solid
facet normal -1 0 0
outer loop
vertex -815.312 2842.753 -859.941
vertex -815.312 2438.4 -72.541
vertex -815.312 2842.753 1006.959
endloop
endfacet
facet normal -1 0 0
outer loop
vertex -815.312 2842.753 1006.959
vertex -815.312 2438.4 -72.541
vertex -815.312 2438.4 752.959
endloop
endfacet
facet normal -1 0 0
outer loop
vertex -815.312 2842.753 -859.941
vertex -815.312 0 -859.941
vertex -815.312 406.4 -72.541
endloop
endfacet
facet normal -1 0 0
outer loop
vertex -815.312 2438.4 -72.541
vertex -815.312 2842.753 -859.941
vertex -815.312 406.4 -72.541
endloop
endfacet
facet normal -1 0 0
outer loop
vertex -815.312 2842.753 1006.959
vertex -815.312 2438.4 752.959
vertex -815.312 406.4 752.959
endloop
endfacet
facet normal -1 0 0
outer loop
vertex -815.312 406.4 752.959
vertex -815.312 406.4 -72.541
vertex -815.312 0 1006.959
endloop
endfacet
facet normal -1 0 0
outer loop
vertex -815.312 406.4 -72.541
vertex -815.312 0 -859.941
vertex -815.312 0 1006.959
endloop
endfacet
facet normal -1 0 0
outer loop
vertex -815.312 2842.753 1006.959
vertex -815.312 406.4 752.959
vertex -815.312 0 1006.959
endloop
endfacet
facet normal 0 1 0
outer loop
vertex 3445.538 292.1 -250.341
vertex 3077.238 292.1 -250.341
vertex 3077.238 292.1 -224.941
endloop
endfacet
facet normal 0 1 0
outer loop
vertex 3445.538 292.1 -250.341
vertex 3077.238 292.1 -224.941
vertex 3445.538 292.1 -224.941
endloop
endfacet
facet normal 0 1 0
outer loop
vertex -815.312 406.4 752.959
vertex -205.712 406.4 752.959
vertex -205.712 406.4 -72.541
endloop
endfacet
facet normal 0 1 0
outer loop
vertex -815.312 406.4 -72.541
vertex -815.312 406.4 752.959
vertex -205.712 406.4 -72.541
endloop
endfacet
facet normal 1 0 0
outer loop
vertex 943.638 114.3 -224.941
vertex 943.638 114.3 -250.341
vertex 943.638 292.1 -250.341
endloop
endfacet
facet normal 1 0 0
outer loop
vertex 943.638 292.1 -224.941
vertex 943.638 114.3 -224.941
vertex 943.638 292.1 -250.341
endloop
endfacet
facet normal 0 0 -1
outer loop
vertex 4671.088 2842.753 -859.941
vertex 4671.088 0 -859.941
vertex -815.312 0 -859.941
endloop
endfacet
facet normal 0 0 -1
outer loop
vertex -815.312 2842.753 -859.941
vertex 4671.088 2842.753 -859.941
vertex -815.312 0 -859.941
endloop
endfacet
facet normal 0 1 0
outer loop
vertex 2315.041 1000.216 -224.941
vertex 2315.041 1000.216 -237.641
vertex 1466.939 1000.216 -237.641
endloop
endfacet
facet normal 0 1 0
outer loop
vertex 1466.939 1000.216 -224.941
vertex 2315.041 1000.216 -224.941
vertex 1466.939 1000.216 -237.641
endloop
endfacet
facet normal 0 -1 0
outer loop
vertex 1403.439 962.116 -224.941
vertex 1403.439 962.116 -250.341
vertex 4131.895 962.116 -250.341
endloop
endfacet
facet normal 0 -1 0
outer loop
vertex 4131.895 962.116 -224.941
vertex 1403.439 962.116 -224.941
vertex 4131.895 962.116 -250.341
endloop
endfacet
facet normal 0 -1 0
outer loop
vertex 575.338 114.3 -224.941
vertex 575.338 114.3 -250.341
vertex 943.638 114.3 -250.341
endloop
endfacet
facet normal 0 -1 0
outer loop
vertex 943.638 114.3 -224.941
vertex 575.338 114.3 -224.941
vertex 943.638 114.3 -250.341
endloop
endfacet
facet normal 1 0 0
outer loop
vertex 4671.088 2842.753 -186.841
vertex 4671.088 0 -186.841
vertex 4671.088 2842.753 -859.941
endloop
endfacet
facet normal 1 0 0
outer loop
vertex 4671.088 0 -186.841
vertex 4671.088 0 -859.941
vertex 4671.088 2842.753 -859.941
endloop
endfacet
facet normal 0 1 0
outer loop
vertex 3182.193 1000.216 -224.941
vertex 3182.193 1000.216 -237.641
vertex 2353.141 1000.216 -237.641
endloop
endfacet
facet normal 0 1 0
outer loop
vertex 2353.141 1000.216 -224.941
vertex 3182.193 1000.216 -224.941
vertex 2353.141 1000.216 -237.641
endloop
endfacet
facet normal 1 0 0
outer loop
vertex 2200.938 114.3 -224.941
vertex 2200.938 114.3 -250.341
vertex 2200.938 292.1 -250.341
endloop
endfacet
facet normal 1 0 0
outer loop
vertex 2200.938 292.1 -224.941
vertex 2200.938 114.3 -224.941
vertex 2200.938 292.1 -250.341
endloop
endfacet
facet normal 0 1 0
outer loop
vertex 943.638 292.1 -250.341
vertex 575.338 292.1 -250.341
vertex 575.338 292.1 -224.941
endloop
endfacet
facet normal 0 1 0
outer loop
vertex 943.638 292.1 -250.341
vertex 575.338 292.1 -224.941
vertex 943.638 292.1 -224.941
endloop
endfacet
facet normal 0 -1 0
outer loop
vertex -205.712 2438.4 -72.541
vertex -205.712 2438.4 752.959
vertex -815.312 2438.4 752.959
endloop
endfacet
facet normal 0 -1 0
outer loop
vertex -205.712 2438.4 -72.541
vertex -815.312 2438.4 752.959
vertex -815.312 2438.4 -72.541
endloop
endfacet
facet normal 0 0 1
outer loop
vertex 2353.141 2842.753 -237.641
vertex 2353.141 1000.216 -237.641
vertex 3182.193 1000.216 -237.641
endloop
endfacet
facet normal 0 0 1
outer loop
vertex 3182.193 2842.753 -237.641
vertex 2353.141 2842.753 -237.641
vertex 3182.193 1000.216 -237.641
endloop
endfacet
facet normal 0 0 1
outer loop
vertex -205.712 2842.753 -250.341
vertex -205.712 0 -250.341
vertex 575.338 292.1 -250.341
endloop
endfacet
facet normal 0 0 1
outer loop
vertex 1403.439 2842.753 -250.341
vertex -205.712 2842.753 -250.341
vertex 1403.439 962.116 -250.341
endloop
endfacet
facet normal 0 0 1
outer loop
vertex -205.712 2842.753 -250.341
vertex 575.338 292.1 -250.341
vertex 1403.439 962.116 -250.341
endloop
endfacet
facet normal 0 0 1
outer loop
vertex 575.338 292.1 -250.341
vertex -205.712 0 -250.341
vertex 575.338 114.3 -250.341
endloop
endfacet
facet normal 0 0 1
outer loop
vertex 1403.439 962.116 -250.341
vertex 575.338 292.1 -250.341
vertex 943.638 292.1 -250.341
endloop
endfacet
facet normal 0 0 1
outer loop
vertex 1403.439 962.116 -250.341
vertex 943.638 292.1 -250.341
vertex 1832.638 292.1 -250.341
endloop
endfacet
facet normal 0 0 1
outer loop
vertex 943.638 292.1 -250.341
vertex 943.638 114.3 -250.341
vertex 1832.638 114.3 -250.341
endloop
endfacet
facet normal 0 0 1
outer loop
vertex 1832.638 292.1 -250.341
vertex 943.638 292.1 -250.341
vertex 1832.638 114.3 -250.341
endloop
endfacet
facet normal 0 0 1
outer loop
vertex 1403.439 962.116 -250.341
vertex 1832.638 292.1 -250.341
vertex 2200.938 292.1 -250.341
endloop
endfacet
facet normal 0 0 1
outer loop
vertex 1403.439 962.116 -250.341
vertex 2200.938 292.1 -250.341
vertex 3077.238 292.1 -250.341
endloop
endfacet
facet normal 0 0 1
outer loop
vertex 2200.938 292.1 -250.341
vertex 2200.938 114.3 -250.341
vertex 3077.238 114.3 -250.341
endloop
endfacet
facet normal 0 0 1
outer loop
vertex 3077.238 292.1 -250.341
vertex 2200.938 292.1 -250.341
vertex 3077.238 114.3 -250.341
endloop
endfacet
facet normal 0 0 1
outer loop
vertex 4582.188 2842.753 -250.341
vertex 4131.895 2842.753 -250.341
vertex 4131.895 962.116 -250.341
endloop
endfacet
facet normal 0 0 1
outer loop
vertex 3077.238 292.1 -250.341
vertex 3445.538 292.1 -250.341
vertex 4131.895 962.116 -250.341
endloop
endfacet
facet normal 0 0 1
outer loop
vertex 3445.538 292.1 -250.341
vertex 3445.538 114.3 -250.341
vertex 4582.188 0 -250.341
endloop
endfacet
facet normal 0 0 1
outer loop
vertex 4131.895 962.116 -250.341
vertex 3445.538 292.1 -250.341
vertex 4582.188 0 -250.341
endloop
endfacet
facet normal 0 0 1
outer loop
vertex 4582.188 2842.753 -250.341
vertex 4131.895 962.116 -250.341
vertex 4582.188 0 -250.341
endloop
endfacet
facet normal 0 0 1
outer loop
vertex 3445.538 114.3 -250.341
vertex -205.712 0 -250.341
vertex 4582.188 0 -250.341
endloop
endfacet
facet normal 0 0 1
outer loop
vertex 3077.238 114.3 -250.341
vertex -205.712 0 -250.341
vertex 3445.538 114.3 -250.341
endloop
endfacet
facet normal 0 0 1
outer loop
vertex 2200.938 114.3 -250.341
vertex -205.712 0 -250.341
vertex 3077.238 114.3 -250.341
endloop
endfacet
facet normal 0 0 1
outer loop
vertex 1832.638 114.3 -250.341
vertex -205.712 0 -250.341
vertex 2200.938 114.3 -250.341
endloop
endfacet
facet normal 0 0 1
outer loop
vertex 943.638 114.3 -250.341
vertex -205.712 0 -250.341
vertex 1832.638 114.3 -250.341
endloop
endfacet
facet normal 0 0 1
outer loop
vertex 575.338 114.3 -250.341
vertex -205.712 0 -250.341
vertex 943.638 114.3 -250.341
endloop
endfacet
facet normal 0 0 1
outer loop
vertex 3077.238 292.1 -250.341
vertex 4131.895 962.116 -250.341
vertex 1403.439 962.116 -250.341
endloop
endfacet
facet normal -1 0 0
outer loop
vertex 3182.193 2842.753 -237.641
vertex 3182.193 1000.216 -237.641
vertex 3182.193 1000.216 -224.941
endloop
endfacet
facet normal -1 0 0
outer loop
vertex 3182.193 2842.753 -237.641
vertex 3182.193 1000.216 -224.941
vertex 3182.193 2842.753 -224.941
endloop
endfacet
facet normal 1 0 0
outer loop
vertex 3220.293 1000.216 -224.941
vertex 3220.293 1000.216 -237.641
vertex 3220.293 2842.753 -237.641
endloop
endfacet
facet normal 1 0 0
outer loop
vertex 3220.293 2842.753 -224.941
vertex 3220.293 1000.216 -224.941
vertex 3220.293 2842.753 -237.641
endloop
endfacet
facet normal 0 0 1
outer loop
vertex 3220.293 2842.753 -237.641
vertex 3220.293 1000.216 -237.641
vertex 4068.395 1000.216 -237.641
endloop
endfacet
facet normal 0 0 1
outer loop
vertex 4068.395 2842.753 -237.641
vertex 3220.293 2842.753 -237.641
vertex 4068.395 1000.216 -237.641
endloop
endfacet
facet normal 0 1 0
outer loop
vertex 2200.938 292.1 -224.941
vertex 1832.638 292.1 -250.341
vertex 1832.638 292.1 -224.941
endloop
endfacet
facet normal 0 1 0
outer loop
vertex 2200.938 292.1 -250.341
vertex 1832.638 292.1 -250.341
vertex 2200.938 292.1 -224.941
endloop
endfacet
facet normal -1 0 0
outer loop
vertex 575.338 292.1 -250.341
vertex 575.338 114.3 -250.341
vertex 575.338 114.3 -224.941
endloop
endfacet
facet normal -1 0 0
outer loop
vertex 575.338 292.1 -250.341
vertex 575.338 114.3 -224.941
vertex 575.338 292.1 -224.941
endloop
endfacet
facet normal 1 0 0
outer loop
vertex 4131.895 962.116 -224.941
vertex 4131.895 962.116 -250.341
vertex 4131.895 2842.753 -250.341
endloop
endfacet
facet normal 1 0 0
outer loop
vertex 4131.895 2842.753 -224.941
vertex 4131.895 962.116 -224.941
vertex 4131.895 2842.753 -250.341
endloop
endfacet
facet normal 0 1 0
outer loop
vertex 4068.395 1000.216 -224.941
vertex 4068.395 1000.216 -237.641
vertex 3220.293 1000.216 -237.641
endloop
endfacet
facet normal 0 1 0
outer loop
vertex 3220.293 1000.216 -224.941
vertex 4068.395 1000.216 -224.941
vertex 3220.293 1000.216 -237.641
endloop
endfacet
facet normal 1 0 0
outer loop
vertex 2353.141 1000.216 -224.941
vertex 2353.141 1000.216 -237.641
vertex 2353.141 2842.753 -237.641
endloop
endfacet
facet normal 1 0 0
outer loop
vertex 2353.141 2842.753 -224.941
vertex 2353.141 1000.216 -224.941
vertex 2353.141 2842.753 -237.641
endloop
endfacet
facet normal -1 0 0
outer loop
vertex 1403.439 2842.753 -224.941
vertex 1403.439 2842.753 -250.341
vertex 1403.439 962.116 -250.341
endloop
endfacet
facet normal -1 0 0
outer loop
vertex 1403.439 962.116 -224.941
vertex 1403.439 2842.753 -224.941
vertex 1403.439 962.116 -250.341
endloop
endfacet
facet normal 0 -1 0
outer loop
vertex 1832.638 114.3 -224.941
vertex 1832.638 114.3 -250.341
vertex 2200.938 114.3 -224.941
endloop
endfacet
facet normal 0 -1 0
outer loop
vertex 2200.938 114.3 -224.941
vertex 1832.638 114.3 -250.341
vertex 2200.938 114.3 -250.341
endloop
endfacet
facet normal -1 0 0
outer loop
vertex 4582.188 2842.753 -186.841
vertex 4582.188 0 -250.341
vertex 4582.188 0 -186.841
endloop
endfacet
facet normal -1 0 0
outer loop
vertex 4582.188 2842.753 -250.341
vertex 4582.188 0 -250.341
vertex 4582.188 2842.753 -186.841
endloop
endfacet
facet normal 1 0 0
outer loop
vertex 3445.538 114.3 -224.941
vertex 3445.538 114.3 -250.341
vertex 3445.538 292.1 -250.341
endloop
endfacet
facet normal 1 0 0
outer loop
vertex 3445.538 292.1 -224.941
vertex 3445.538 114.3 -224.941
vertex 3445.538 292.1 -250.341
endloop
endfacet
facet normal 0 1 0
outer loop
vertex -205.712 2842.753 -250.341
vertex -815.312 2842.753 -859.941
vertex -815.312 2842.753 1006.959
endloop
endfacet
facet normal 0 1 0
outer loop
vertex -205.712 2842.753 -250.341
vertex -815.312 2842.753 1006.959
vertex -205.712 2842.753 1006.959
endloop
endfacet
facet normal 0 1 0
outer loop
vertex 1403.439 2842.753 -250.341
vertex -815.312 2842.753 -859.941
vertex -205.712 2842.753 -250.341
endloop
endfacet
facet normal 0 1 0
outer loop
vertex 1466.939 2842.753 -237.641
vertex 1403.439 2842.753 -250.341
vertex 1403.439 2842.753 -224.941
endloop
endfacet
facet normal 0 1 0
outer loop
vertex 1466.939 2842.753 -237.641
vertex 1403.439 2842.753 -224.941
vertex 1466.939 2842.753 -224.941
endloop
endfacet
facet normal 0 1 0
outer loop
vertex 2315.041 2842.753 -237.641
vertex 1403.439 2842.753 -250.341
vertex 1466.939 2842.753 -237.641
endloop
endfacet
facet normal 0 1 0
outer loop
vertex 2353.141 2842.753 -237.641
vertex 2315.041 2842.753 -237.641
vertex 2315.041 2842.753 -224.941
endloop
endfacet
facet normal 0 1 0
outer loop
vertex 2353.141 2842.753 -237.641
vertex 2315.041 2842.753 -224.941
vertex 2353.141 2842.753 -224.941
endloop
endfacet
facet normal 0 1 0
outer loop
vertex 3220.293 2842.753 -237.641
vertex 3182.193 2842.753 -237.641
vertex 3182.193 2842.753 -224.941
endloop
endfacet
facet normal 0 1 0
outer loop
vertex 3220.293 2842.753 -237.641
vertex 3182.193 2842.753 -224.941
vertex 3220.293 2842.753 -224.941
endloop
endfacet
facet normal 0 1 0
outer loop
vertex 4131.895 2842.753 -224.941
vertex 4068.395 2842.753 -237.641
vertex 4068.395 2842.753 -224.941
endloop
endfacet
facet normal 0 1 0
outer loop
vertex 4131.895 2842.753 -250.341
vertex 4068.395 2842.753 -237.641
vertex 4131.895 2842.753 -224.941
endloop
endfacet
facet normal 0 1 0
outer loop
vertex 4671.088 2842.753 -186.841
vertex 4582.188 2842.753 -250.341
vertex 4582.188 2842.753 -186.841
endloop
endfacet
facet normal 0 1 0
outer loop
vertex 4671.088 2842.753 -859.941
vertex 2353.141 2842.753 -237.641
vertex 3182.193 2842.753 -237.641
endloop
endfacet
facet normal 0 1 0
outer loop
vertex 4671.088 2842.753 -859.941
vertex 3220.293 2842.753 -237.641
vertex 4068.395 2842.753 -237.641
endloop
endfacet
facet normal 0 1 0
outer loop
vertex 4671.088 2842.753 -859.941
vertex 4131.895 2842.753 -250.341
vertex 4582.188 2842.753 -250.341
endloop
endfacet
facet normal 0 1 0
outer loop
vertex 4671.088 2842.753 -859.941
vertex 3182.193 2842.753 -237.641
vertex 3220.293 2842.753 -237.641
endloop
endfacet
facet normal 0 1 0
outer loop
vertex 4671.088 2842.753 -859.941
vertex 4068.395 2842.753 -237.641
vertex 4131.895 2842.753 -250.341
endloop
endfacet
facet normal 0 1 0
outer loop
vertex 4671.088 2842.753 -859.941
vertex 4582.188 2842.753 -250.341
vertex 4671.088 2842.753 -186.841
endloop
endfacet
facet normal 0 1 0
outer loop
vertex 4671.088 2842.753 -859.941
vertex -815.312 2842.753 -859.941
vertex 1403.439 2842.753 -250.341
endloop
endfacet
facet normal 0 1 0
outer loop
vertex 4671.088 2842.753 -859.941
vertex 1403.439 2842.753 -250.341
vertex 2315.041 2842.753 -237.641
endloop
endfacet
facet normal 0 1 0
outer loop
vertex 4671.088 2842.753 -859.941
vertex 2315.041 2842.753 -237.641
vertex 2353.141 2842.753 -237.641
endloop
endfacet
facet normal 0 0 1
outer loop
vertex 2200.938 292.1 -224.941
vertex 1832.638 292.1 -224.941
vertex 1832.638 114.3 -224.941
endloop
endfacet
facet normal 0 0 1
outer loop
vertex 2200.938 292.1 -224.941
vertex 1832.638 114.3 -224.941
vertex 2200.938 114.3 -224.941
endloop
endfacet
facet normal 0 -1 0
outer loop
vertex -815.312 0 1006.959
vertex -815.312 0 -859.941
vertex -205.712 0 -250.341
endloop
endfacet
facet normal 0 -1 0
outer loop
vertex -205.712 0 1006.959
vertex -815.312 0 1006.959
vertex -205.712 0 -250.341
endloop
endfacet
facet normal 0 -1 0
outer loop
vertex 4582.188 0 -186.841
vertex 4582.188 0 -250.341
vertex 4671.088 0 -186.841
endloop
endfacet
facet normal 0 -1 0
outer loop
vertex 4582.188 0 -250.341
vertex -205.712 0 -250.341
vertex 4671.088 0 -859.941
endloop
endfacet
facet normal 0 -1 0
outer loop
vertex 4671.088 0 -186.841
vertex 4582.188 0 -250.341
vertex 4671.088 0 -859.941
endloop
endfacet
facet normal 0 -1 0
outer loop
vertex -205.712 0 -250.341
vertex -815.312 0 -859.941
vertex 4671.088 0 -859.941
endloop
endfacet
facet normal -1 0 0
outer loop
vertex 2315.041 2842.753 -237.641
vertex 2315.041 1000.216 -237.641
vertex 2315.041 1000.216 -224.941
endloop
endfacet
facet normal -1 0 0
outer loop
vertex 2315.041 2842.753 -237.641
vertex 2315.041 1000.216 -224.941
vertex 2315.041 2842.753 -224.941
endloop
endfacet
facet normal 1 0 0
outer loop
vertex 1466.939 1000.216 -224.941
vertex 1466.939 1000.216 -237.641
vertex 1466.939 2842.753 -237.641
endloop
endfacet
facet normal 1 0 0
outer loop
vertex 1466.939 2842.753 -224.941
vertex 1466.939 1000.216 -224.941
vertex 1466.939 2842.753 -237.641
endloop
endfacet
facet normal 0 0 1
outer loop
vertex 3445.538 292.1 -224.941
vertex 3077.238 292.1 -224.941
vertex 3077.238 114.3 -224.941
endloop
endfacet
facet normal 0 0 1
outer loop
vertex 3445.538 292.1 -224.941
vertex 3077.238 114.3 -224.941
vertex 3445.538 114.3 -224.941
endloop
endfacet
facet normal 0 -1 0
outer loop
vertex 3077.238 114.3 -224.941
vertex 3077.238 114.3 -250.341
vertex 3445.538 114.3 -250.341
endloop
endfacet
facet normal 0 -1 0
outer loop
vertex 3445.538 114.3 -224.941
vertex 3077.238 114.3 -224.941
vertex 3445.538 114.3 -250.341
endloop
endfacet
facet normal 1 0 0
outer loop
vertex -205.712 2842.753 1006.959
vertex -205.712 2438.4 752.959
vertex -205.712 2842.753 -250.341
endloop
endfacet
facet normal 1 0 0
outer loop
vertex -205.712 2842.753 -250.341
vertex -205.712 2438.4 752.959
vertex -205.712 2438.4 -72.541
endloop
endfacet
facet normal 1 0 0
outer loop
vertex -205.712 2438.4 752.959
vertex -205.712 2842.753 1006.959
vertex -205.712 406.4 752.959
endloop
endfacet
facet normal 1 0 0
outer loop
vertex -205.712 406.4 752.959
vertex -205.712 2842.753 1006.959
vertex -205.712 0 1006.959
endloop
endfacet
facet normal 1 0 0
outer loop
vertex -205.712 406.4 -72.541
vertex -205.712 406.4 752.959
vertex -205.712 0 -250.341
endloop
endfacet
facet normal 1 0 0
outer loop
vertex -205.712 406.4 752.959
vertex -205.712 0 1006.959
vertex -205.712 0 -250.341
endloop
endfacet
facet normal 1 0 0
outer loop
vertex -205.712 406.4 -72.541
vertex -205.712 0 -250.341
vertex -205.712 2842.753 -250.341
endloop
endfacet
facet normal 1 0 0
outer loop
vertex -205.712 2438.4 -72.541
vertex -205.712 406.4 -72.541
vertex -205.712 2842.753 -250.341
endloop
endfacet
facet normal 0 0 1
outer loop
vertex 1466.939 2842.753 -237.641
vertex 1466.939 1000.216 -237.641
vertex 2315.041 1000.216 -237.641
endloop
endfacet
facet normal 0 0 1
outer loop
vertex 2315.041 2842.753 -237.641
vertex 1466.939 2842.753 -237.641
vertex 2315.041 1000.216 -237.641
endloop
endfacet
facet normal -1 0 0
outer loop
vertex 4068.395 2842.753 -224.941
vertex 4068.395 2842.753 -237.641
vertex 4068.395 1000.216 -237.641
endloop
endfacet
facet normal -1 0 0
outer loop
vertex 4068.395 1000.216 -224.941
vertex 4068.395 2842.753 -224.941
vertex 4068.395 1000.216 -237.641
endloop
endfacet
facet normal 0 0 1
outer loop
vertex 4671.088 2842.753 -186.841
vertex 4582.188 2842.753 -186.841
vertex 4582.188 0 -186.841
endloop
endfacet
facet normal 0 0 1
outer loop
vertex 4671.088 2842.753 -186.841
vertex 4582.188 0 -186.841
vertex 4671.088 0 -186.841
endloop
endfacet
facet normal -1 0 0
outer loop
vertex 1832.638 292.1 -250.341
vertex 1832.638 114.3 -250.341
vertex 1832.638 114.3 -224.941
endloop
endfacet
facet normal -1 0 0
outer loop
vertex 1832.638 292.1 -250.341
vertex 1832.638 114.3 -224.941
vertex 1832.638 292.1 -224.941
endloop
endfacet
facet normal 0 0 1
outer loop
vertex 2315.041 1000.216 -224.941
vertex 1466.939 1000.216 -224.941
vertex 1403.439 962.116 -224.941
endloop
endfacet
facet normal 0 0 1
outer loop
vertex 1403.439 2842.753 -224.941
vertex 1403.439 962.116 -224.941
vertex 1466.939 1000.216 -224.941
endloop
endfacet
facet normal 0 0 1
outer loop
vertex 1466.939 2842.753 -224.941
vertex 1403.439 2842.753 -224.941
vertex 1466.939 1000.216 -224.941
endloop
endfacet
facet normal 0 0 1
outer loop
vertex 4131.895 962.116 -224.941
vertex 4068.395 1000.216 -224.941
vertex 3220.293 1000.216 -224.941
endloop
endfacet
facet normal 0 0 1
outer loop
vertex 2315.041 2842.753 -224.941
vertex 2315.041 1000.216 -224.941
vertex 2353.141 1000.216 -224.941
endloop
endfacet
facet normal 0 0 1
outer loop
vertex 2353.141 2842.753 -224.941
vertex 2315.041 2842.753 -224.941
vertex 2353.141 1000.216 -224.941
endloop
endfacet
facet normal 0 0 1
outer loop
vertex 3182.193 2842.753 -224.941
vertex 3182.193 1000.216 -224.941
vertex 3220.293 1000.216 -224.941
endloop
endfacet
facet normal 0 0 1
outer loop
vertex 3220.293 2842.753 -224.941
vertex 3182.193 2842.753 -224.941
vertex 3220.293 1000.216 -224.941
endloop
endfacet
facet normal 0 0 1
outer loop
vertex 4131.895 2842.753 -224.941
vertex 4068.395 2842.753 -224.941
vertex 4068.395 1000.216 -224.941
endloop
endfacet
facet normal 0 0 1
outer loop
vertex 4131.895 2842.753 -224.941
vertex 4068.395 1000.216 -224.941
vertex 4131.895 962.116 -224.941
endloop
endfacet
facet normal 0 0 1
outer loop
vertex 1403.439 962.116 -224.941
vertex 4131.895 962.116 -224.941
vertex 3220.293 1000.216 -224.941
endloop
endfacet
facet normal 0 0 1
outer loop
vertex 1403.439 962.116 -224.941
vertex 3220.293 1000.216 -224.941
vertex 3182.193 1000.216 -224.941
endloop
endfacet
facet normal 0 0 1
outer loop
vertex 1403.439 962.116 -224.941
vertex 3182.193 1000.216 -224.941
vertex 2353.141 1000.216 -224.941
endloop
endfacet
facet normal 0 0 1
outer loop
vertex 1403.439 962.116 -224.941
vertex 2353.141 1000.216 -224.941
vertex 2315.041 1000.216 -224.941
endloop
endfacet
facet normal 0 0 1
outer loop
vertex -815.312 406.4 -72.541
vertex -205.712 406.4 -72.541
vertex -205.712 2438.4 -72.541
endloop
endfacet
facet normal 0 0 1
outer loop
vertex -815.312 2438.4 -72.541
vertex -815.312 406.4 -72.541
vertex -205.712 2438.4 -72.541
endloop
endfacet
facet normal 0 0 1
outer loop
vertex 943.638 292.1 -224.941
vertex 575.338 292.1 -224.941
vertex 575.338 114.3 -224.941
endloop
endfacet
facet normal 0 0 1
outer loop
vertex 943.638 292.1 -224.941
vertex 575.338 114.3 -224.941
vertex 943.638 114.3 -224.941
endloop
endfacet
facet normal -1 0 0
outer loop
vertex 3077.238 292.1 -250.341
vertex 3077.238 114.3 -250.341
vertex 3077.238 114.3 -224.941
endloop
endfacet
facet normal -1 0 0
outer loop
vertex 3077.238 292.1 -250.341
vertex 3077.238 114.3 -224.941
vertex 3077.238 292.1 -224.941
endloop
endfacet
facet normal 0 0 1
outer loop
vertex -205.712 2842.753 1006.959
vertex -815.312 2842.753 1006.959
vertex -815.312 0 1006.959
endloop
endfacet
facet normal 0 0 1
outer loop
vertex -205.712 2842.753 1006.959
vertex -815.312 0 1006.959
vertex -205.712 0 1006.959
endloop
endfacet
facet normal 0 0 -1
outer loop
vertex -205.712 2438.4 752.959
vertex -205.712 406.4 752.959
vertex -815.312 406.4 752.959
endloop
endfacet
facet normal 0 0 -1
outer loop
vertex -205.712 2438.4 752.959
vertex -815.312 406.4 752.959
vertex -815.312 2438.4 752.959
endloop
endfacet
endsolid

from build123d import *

# Parameters (mm, degrees)
HOUSE_EXTRUDE_Y_DEPTH        = 2842.753046323
DOOR_W                       = 825.5
DOOR_H                       = 2032
DOOR_CUT_X_DEPTH             = 609.6
WINDOW_W                     = 38.1
WINDOW_H                     = 1842.537075404
WINDOW_FRAME_EXTRUDE_Z_DEPTH = 25.4
WINDOW_3_W                   = 848.102040266
WINDOW_3_H                   = 1842.537075404
WINDOW_3_W_2                 = 829.052040266
WINDOW_GLASS_EXTRUDE_Z_DEPTH = 12.7
DRAIN_PIPE_W                 = 88.9
DRAIN_PIPE_H                 = 2842.753046323
DRAIN_PIPE_EXTRUDE_Z_DEPTH   = 63.5
VENTS_W                      = 368.3
VENTS_H                      = 177.8
VENTS_EXTRUDE_Z_DEPTH        = 25.4


with BuildPart() as part:
    # Wall Footprint → House Extrude +Y (new body)
    with BuildSketch(Plane(origin=(0, 0, 0), x_dir=(1, 0, 0), z_dir=(0, 1, 0))):
        Polygon((-205.711590821, 250.340578873), (4671.088409179, 250.340578873), (4671.088409179, 859.940578873), (-815.311590821, 859.940578873), (-815.311590821, -1006.959421127), (-205.711590821, -1006.959421127), align=None)
    extrude(amount=HOUSE_EXTRUDE_Y_DEPTH)

    # Door → Door Cut -X (cut)
    with BuildSketch(Plane(origin=(-205.711590821, 0, 0), x_dir=(0, 0, -1), z_dir=(1, 0, 0))):
        with Locations((-340.209421127, 1422.4)):
            Rectangle(DOOR_W, DOOR_H)
    extrude(amount=-DOOR_CUT_X_DEPTH, mode=Mode.SUBTRACT)

    # Window → Window Frame Extrude +Z (add)
    with BuildSketch(Plane.XY.offset(-250.340578873)):
        Polygon((1403.438613425, 2842.753046323), (1403.438613425, 962.115970919), (4131.894734223, 962.115970919), (4131.894734223, 2842.753046323), (4068.394734223, 2842.753046323), (4068.394734223, 1000.215970919), (3220.292693957, 1000.215970919), (3182.192693957, 1000.215970919), (2353.140653691, 1000.215970919), (2315.040653691, 1000.215970919), (1466.938613425, 1000.215970919), (1466.938613425, 2842.753046323), align=None)
        with Locations((2334.090653691, 1921.484508621)):
            Rectangle(WINDOW_W, WINDOW_H)
        with Locations((3201.242693957, 1921.484508621)):
            Rectangle(WINDOW_W, WINDOW_H)
    extrude(amount=WINDOW_FRAME_EXTRUDE_Z_DEPTH)

    # Window<3> → Window Glass Extrude +Z (add)
    with BuildSketch(Plane.XY.offset(-250.340578873)):
        with Locations((1890.989633558, 1921.484508621)):
            Rectangle(WINDOW_3_W, WINDOW_3_H)
        with Locations((2767.666673824, 1921.484508621)):
            Rectangle(WINDOW_3_W_2, WINDOW_3_H)
        with Locations((3644.34371409, 1921.484508621)):
            Rectangle(WINDOW_3_W, WINDOW_3_H)
    extrude(amount=WINDOW_GLASS_EXTRUDE_Z_DEPTH)

    # Drain Pipe → Drain Pipe Extrude +Z (add)
    with BuildSketch(Plane.XY.offset(-250.340578873)):
        with Locations((4626.638409179, 1421.376523162)):
            Rectangle(DRAIN_PIPE_W, DRAIN_PIPE_H)
    extrude(amount=DRAIN_PIPE_EXTRUDE_Z_DEPTH)

    # Vents → Vents Extrude +Z (add)
    with BuildSketch(Plane.XY.offset(-250.340578873)):
        with Locations((3261.388409179, 203.2)):
            Rectangle(VENTS_W, VENTS_H)
        with Locations((2016.788409179, 203.2)):
            Rectangle(VENTS_W, VENTS_H)
        with Locations((759.488409179, 203.2)):
            Rectangle(VENTS_W, VENTS_H)
    extrude(amount=VENTS_EXTRUDE_Z_DEPTH)


solid = part.part
